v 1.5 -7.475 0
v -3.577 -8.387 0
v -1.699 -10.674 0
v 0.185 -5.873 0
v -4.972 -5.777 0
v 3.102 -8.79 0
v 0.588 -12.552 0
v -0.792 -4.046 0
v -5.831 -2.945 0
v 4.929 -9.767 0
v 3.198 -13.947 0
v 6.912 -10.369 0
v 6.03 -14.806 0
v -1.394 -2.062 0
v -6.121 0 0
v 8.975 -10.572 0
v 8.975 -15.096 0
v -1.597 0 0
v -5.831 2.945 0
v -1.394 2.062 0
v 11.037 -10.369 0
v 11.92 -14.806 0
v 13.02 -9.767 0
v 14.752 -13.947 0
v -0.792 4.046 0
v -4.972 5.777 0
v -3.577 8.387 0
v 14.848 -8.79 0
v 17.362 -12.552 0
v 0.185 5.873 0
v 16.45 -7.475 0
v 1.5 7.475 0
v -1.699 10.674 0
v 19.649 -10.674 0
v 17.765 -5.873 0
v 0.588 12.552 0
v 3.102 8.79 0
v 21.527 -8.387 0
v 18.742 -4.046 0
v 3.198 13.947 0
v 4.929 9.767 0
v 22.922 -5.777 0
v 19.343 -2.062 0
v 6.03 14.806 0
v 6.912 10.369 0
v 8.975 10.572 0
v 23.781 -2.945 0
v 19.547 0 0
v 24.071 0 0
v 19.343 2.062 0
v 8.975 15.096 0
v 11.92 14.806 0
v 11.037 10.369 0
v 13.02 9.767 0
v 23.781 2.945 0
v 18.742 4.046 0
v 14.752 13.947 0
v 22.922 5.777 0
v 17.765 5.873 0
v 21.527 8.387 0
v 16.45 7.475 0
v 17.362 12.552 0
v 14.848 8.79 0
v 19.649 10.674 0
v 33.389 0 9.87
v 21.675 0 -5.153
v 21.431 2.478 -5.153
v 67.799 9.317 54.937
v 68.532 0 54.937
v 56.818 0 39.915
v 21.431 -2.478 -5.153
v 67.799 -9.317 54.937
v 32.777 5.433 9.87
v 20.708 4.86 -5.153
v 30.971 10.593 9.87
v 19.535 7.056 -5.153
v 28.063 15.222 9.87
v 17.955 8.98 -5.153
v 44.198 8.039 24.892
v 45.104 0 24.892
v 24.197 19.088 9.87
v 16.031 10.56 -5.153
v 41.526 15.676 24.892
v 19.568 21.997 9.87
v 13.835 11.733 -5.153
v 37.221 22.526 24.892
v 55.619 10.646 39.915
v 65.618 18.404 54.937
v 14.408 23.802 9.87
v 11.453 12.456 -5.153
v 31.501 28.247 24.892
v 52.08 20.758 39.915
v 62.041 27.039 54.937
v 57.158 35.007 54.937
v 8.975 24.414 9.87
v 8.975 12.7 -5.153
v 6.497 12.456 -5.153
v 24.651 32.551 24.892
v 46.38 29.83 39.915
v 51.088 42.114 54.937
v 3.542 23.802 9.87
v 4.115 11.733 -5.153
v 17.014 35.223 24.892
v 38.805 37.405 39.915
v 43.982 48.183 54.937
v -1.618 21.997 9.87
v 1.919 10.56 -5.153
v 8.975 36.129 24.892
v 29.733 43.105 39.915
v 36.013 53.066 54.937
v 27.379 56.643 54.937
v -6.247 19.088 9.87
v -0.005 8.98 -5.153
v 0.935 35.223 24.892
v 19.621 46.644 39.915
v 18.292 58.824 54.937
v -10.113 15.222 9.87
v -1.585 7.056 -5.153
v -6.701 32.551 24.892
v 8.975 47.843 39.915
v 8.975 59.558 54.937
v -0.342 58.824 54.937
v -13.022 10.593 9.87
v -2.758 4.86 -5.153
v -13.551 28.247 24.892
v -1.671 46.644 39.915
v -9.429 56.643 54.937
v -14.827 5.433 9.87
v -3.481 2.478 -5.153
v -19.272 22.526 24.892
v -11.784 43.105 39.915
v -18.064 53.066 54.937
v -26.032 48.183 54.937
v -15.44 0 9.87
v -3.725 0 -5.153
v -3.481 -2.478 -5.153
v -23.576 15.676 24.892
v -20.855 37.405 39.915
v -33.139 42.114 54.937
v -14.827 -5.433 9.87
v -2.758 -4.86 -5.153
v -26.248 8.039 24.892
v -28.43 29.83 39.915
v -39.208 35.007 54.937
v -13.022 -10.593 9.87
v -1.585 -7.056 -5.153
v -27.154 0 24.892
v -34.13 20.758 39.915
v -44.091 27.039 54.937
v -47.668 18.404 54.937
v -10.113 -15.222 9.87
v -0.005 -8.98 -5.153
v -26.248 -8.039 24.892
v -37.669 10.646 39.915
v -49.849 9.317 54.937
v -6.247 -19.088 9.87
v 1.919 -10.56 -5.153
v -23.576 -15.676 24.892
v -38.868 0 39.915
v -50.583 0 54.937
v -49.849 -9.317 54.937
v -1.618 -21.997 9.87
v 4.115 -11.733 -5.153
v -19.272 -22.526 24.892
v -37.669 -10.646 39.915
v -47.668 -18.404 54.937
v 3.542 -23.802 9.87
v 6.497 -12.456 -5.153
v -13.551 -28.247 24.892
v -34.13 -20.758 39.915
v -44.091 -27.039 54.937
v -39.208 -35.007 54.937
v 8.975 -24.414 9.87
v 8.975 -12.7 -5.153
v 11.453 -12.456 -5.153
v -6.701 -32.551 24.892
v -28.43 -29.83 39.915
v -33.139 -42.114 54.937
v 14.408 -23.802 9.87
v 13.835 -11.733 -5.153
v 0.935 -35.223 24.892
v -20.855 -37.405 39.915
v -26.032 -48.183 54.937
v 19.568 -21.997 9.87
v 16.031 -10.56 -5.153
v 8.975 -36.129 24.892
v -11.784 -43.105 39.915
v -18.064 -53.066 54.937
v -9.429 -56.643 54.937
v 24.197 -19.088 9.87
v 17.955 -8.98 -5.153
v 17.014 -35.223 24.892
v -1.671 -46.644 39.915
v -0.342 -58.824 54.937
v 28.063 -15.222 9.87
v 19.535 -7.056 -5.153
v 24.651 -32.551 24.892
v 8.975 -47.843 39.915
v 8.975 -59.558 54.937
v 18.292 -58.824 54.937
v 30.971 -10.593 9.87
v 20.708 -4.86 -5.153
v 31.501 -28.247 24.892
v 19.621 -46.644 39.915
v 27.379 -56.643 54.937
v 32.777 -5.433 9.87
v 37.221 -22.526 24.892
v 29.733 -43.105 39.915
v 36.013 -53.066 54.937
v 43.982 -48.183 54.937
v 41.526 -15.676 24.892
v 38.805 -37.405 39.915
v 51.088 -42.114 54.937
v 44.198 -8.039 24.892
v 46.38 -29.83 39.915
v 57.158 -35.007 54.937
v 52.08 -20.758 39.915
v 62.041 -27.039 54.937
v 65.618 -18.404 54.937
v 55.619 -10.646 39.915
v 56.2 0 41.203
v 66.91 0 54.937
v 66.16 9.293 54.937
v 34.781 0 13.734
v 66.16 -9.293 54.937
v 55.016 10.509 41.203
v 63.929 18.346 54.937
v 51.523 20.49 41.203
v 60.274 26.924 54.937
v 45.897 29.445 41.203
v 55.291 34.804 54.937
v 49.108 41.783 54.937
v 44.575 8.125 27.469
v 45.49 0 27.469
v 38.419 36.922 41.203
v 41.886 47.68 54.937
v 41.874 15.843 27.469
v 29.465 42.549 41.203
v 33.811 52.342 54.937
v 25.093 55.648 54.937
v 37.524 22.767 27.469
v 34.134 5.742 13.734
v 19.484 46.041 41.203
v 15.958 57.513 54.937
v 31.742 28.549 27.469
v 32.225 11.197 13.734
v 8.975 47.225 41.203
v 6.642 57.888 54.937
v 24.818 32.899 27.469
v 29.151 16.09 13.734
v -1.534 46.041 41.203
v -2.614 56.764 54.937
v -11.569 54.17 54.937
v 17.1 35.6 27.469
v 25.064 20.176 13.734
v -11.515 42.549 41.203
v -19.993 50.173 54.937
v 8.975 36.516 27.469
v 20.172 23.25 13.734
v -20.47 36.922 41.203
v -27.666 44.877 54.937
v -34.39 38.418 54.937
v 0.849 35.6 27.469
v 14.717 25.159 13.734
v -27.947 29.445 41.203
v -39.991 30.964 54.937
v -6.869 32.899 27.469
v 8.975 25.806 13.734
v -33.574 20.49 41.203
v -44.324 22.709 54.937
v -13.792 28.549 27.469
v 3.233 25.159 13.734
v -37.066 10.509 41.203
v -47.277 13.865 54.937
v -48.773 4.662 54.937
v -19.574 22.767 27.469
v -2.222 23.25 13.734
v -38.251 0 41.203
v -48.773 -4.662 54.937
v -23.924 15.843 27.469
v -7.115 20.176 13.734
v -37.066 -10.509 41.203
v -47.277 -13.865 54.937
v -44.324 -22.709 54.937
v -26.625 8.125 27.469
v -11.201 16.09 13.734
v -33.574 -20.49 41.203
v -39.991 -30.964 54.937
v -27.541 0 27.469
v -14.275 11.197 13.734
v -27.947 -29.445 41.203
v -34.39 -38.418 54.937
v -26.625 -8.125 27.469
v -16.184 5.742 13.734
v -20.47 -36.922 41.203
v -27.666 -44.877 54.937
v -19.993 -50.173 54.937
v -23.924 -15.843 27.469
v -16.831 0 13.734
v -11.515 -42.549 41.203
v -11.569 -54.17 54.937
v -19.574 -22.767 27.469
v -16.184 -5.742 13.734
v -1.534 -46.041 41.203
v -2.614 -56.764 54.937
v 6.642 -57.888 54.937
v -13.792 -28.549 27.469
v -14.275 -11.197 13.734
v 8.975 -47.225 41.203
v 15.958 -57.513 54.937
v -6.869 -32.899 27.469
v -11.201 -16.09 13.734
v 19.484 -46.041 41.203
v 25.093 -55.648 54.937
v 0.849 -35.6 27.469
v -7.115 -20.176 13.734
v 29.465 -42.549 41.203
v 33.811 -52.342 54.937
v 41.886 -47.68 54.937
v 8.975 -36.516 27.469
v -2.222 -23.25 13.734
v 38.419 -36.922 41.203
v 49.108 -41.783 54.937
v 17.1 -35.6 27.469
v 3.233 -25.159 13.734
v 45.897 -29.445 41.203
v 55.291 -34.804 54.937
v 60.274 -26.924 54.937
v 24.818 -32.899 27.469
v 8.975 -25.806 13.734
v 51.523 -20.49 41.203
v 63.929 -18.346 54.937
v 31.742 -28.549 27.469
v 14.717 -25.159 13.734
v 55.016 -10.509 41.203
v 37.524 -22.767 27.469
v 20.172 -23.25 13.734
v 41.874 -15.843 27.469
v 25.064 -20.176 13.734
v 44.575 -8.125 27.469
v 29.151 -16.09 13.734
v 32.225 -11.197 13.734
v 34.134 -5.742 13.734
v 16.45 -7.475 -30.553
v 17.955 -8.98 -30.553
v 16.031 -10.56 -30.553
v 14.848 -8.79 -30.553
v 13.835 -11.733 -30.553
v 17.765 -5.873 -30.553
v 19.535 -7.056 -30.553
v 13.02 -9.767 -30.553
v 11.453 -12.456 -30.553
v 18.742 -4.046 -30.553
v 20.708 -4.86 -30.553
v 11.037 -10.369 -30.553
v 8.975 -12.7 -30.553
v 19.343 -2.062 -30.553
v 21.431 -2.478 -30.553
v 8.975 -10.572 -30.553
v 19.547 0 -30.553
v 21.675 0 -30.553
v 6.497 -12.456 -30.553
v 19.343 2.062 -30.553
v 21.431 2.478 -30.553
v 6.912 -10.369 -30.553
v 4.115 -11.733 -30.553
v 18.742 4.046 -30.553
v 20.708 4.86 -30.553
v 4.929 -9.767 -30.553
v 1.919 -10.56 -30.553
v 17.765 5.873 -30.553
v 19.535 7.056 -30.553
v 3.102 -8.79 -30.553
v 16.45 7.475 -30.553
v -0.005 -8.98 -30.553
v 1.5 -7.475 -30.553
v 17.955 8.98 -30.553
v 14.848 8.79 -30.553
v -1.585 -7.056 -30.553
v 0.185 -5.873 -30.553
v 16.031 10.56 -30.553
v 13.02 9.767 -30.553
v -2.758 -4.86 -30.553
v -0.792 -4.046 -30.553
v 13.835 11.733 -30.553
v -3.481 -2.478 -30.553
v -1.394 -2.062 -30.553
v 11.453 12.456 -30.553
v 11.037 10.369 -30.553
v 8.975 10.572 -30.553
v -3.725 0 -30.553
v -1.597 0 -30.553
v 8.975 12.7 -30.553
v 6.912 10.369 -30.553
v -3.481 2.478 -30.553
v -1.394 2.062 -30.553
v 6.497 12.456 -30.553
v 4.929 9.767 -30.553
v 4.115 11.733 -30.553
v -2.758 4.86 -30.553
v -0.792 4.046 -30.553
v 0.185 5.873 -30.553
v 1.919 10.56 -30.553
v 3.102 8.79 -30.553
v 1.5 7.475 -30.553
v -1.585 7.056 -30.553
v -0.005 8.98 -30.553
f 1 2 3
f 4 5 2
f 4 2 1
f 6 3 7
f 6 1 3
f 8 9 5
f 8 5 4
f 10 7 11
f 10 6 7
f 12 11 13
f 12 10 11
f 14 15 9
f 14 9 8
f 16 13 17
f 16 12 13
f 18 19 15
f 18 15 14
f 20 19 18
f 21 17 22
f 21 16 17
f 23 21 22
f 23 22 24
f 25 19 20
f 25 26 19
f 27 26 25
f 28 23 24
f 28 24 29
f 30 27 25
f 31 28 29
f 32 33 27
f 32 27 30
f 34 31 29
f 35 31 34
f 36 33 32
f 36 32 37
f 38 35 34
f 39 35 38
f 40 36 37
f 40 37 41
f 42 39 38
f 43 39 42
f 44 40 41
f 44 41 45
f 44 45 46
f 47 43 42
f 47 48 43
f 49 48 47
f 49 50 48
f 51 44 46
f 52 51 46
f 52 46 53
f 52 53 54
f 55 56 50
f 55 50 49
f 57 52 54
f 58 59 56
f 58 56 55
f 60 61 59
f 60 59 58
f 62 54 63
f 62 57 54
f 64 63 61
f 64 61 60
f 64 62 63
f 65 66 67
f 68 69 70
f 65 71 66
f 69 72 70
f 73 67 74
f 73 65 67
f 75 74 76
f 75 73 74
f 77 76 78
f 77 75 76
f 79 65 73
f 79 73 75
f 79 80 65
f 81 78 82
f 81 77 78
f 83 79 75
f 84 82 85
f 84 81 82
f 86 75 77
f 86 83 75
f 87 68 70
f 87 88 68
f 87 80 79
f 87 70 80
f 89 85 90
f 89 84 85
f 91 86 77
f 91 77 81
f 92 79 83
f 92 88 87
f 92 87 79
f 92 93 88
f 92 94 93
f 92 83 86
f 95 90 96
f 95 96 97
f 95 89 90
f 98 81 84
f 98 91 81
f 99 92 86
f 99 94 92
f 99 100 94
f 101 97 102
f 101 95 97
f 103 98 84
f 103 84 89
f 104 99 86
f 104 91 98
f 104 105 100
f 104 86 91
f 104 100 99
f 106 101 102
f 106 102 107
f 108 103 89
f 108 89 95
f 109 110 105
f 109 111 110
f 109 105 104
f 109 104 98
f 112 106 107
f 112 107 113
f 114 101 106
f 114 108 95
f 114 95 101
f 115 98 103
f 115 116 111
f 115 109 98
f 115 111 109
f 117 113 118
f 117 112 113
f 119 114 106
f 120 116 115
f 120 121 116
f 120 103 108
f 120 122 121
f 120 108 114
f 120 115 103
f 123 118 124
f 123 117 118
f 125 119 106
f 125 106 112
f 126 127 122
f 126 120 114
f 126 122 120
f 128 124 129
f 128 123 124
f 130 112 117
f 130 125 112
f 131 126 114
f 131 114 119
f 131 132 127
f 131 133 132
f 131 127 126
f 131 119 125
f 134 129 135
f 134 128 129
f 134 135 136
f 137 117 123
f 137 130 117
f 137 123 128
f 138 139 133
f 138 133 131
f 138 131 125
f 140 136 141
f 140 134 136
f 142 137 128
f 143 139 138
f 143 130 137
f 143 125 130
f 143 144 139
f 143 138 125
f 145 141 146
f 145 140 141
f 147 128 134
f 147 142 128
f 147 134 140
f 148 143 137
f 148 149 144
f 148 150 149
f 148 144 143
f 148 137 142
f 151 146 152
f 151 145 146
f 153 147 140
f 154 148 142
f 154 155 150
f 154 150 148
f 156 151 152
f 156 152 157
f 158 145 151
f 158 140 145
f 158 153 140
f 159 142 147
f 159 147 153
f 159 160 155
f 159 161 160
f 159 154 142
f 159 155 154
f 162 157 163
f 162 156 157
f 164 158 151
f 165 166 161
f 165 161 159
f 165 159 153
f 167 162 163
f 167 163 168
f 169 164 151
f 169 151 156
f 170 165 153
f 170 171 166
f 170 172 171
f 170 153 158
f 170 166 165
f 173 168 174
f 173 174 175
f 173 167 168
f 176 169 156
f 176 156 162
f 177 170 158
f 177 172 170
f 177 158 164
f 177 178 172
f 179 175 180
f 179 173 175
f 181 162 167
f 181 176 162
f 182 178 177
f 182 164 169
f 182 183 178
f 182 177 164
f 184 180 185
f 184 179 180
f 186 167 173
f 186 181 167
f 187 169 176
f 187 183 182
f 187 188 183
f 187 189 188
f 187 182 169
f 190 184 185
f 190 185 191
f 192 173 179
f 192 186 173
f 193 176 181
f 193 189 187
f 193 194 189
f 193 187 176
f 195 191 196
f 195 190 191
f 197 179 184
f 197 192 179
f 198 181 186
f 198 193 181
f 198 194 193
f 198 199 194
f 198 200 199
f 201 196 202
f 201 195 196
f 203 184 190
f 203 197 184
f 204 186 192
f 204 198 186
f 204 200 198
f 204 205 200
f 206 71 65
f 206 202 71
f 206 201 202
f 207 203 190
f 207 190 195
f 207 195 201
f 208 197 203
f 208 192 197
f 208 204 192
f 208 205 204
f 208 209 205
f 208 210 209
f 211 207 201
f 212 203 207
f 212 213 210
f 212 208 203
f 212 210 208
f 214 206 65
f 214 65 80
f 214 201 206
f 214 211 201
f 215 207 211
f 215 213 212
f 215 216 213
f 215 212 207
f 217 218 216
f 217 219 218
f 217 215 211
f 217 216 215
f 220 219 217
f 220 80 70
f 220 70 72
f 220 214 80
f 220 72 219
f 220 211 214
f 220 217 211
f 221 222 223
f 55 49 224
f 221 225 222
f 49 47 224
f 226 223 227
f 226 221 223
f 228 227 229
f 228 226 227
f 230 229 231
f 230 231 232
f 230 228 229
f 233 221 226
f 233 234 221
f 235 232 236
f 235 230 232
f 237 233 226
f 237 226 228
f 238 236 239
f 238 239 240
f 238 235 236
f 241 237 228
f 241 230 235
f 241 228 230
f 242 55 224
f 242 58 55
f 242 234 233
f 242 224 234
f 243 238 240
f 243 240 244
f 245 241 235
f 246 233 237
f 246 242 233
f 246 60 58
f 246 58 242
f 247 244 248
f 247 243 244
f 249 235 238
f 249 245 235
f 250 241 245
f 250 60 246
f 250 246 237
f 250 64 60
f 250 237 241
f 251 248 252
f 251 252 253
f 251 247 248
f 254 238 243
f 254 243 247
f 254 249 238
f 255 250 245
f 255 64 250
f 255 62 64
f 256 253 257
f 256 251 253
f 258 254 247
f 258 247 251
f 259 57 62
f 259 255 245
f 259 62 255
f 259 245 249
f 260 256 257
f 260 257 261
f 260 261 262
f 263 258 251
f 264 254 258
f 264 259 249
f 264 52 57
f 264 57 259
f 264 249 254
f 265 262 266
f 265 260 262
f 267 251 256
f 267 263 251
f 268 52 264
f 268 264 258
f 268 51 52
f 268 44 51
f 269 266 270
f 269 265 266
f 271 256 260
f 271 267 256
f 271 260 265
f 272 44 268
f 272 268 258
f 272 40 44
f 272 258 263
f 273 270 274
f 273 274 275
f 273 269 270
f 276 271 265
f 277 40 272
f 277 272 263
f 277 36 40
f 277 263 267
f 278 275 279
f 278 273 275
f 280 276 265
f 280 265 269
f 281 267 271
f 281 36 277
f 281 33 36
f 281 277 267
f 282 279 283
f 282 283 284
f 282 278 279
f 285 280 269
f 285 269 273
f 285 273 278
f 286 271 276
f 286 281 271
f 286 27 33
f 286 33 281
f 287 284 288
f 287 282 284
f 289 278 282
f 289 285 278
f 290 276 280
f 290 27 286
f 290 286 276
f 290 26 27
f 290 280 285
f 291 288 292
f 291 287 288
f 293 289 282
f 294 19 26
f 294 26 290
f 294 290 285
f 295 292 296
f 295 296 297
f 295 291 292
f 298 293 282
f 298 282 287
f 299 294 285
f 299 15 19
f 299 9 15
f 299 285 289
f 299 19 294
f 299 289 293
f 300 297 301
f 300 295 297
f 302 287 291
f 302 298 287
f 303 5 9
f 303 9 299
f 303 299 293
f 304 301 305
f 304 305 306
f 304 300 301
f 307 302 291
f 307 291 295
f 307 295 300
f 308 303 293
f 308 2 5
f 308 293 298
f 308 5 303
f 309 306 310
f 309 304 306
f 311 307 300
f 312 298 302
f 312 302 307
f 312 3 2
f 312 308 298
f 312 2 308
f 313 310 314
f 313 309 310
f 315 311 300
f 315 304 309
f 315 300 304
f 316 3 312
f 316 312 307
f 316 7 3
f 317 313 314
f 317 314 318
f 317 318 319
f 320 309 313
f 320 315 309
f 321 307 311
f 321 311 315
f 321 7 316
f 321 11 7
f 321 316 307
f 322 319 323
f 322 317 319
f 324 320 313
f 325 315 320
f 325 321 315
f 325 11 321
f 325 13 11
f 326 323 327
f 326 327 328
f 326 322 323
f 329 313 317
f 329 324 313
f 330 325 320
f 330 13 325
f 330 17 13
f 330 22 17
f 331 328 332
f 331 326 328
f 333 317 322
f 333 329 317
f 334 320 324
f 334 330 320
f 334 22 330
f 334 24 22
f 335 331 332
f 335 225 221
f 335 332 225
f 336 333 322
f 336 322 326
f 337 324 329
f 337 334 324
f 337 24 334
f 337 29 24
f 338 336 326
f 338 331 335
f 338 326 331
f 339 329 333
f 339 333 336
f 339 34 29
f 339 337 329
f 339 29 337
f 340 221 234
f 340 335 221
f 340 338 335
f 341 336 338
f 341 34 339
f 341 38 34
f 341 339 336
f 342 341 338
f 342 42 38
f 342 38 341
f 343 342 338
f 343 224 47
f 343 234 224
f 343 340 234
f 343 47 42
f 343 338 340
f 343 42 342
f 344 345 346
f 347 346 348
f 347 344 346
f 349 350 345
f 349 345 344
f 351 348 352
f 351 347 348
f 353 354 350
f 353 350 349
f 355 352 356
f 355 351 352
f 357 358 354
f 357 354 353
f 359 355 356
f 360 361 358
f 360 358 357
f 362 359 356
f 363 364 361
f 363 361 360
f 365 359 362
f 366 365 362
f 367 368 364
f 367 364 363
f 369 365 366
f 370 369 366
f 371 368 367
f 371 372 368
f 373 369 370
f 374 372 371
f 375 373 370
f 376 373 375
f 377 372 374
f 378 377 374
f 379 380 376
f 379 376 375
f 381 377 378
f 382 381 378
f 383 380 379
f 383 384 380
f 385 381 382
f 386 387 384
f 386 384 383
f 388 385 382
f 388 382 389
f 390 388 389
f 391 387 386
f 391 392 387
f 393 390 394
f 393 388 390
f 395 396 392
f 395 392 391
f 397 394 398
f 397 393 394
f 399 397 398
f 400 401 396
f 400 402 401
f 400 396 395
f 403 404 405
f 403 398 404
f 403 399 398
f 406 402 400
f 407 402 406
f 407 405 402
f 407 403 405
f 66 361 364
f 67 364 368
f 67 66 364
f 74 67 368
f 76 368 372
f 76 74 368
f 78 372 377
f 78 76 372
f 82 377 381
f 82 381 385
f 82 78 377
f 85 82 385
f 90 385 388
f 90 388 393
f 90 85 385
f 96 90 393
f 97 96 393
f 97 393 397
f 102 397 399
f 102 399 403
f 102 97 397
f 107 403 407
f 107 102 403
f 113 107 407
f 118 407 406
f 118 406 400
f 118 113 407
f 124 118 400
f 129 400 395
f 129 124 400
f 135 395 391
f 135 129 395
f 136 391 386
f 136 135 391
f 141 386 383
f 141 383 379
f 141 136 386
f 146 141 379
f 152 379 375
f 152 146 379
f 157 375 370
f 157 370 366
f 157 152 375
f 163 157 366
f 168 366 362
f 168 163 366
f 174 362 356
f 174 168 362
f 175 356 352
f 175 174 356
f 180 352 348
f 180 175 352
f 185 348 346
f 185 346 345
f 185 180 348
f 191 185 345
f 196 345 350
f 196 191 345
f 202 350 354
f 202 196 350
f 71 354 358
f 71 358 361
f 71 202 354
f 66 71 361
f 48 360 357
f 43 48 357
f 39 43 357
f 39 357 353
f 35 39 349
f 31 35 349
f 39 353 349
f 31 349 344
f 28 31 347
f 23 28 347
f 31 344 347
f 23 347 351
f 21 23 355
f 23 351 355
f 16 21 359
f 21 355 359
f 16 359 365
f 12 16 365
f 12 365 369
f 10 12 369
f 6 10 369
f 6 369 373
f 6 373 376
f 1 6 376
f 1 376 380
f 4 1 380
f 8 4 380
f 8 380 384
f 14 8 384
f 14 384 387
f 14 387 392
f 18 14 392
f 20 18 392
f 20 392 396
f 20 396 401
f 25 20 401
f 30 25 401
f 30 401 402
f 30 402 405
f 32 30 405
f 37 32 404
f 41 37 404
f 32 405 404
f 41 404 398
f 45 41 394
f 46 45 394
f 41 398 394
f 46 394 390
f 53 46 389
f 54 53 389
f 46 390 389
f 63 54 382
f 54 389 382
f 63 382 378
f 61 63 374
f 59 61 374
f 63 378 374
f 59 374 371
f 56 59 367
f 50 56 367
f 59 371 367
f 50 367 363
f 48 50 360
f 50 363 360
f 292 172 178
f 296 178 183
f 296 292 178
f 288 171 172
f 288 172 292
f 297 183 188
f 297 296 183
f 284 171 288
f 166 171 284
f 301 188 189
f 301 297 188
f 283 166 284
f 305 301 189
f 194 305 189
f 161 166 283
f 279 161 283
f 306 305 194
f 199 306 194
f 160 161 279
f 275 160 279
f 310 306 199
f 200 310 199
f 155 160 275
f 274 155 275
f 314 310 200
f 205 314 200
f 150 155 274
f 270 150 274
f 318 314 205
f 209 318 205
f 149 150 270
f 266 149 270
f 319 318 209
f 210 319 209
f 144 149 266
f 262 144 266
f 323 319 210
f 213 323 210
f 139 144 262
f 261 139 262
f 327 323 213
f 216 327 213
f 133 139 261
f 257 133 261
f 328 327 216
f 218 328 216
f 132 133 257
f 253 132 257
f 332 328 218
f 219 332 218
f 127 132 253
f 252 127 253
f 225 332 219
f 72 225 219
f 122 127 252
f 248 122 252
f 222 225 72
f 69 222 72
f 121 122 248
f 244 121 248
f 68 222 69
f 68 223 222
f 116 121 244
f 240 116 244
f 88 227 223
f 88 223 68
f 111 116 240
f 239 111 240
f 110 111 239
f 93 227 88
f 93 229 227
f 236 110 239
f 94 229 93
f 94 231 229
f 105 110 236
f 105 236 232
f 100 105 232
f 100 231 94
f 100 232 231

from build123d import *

# Parameters (mm, degrees)
F2_R     = 10.571716
F3_DEPTH = 22.86
F4_R     = 10.571716
F5_DEPTH = 25.4


with BuildPart() as f1:
    # F0 (on Front) → F1 (revolve)
    with BuildSketch(Plane.XZ):
        Polygon((8.974869, -30.552745), (21.674869, -30.552745), (21.674869, -5.152745), (68.532457, 54.937241), (66.91015, 54.937241), (24.070622, 0), (8.974869, 0), align=None)
    revolve(axis=Axis((8.974869, 0, -15.276372), (0, 0, 1)))

    # F2 (on face) → F3 (cut)
    with BuildSketch(Plane(origin=(0, 0, -30.552745), x_dir=(1, 0, 0), z_dir=(0, 0, -1))):
        with Locations((8.974869, 0)):
            Circle(F2_R)
    extrude(amount=-F3_DEPTH, mode=Mode.SUBTRACT)

    # F4 (on face) → F5 (cut)
    with BuildSketch(Plane(origin=(0, 0, -7.692745), x_dir=(1, 0, 0), z_dir=(0, 0, -1))):
        with Locations((8.974869, 0)):
            Circle(F4_R)
    extrude(amount=-F5_DEPTH, mode=Mode.SUBTRACT)


solid = f1.part
